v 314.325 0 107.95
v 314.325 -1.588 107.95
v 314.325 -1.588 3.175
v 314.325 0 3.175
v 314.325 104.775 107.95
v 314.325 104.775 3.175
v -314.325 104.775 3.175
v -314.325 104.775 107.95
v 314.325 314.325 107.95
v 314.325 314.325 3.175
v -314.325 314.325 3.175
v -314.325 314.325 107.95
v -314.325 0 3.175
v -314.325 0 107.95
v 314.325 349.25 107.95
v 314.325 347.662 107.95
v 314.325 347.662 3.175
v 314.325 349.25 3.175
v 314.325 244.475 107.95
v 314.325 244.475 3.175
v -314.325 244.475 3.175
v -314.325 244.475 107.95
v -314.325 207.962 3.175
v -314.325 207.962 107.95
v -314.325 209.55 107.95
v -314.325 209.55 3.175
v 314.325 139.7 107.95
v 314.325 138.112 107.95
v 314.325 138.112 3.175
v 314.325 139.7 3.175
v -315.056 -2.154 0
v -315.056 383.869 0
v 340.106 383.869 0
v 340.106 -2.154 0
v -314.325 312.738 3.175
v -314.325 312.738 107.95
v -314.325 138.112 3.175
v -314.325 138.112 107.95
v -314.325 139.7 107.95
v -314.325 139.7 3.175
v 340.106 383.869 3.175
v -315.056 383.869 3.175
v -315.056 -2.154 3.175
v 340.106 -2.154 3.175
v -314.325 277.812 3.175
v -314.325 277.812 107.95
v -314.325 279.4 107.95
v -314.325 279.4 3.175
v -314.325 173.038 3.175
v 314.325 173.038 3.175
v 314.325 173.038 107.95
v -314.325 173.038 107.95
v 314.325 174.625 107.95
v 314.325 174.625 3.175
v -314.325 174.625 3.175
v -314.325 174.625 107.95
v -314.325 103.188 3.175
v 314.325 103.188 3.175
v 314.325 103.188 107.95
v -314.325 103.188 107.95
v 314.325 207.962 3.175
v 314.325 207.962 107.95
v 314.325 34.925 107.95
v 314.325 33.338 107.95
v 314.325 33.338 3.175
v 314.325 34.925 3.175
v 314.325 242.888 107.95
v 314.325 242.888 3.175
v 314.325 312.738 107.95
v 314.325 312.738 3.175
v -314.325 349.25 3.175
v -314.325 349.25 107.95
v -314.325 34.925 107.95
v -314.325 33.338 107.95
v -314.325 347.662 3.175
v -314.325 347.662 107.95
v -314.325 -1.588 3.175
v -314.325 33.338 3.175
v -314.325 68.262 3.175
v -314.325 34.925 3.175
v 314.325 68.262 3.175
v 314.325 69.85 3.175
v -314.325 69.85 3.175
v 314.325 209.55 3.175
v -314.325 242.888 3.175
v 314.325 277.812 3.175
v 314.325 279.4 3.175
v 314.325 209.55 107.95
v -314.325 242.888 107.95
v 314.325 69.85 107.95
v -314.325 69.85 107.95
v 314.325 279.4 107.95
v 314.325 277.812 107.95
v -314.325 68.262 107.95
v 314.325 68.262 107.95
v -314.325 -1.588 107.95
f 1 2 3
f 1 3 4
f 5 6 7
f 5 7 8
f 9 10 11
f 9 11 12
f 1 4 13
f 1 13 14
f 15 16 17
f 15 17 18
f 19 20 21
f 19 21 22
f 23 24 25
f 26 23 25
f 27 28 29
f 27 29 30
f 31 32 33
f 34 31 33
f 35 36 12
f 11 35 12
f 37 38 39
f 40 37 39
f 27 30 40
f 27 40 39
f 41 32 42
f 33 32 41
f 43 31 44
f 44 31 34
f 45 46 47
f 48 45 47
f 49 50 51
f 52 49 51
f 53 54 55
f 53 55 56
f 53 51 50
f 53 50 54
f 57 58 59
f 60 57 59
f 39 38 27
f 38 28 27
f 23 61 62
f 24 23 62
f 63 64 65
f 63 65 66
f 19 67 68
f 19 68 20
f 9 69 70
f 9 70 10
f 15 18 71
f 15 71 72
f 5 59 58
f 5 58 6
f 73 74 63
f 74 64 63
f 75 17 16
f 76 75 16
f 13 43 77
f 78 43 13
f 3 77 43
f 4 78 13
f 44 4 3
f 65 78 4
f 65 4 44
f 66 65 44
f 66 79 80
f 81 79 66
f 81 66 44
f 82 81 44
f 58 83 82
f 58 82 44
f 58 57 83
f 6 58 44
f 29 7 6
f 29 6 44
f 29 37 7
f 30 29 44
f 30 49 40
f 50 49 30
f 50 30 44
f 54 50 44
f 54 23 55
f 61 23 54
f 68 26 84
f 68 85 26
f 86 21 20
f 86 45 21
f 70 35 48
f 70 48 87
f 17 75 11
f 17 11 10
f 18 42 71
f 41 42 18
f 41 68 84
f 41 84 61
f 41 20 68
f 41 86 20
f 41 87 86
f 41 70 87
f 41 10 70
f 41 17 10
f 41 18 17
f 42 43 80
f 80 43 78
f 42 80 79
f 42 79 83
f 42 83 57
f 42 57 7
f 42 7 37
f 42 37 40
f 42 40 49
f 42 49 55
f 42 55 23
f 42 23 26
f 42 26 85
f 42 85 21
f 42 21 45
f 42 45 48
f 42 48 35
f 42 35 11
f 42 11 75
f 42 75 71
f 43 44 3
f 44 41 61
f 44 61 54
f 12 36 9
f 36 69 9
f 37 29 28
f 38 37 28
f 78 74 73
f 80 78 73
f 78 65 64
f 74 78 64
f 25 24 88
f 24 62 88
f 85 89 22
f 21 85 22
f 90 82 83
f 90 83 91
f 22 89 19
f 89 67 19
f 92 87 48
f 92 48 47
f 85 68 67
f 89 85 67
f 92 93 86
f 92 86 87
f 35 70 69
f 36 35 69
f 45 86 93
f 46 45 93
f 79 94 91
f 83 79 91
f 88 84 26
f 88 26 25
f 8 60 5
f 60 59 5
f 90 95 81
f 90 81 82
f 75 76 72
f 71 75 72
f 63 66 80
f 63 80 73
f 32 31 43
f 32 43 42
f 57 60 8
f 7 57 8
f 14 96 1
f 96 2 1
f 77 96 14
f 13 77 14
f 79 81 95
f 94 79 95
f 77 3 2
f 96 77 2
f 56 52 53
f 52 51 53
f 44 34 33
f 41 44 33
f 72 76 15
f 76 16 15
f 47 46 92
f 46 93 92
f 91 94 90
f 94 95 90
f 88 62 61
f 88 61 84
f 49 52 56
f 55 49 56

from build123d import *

# Parameters (mm, degrees)
F0_W     = 1.5875
F0_H     = 107.95
F1_DEPTH = 314.325
F2_W     = 655.1622450352
F2_H     = 386.0229451675
F3_DEPTH = 3.175


with BuildPart() as f1:
    # F0 (on Right) → F1 (new body, symmetric)
    with BuildSketch(Plane.YZ):
        with Locations((348.45625, 53.975)):
            Rectangle(F0_W, F0_H)
    extrude(amount=F1_DEPTH, both=True)



with BuildPart() as f1b:
    # F0 (on Right) → F1, piece 2 (new body, symmetric)
    with BuildSketch(Plane.YZ):
        with Locations((313.53125, 53.975)):
            Rectangle(F0_W, F0_H)
    extrude(amount=F1_DEPTH, both=True)


with BuildPart() as f1c:
    # F0 (on Right) → F1, piece 3 (new body, symmetric)
    with BuildSketch(Plane.YZ):
        with Locations((278.60625, 53.975)):
            Rectangle(F0_W, F0_H)
    extrude(amount=F1_DEPTH, both=True)


with BuildPart() as f1d:
    # F0 (on Right) → F1, piece 4 (new body, symmetric)
    with BuildSketch(Plane.YZ):
        with Locations((243.68125, 53.975)):
            Rectangle(F0_W, F0_H)
    extrude(amount=F1_DEPTH, both=True)


with BuildPart() as f1e:
    # F0 (on Right) → F1, piece 5 (new body, symmetric)
    with BuildSketch(Plane.YZ):
        with Locations((208.75625, 53.975)):
            Rectangle(F0_W, F0_H)
    extrude(amount=F1_DEPTH, both=True)


with BuildPart() as f1f:
    # F0 (on Right) → F1, piece 6 (new body, symmetric)
    with BuildSketch(Plane.YZ):
        with Locations((173.83125, 53.975)):
            Rectangle(F0_W, F0_H)
    extrude(amount=F1_DEPTH, both=True)


with BuildPart() as f1g:
    # F0 (on Right) → F1, piece 7 (new body, symmetric)
    with BuildSketch(Plane.YZ):
        with Locations((138.90625, 53.975)):
            Rectangle(F0_W, F0_H)
    extrude(amount=F1_DEPTH, both=True)


with BuildPart() as f1h:
    # F0 (on Right) → F1, piece 8 (new body, symmetric)
    with BuildSketch(Plane.YZ):
        with Locations((103.98125, 53.975)):
            Rectangle(F0_W, F0_H)
    extrude(amount=F1_DEPTH, both=True)


with BuildPart() as f1i:
    # F0 (on Right) → F1, piece 9 (new body, symmetric)
    with BuildSketch(Plane.YZ):
        with Locations((69.05625, 53.975)):
            Rectangle(F0_W, F0_H)
    extrude(amount=F1_DEPTH, both=True)


with BuildPart() as f1j:
    # F0 (on Right) → F1, piece 10 (new body, symmetric)
    with BuildSketch(Plane.YZ):
        with Locations((34.13125, 53.975)):
            Rectangle(F0_W, F0_H)
    extrude(amount=F1_DEPTH, both=True)


with BuildPart() as f1k:
    # F0 (on Right) → F1, piece 11 (new body, symmetric)
    with BuildSketch(Plane.YZ):
        with Locations((-0.79375, 53.975)):
            Rectangle(F0_W, F0_H)
    extrude(amount=F1_DEPTH, both=True)


with BuildPart() as f1_1:
    add(f1.part)

    add(f1b.part)  # F3 merges F1b

    add(f1c.part)  # F3 merges F1c

    add(f1d.part)  # F3 merges F1d

    add(f1e.part)  # F3 merges F1e

    add(f1f.part)  # F3 merges F1f

    add(f1g.part)  # F3 merges F1g

    add(f1h.part)  # F3 merges F1h

    add(f1i.part)  # F3 merges F1i

    add(f1j.part)  # F3 merges F1j

    add(f1k.part)  # F3 merges F1k
    # F2 (on Top) → F3 (join)
    with BuildSketch(Plane.XY):
        with Locations((12.5250071287, 190.857162117)):
            Rectangle(F2_W, F2_H)
    extrude(amount=F3_DEPTH)


solid = f1_1.part
